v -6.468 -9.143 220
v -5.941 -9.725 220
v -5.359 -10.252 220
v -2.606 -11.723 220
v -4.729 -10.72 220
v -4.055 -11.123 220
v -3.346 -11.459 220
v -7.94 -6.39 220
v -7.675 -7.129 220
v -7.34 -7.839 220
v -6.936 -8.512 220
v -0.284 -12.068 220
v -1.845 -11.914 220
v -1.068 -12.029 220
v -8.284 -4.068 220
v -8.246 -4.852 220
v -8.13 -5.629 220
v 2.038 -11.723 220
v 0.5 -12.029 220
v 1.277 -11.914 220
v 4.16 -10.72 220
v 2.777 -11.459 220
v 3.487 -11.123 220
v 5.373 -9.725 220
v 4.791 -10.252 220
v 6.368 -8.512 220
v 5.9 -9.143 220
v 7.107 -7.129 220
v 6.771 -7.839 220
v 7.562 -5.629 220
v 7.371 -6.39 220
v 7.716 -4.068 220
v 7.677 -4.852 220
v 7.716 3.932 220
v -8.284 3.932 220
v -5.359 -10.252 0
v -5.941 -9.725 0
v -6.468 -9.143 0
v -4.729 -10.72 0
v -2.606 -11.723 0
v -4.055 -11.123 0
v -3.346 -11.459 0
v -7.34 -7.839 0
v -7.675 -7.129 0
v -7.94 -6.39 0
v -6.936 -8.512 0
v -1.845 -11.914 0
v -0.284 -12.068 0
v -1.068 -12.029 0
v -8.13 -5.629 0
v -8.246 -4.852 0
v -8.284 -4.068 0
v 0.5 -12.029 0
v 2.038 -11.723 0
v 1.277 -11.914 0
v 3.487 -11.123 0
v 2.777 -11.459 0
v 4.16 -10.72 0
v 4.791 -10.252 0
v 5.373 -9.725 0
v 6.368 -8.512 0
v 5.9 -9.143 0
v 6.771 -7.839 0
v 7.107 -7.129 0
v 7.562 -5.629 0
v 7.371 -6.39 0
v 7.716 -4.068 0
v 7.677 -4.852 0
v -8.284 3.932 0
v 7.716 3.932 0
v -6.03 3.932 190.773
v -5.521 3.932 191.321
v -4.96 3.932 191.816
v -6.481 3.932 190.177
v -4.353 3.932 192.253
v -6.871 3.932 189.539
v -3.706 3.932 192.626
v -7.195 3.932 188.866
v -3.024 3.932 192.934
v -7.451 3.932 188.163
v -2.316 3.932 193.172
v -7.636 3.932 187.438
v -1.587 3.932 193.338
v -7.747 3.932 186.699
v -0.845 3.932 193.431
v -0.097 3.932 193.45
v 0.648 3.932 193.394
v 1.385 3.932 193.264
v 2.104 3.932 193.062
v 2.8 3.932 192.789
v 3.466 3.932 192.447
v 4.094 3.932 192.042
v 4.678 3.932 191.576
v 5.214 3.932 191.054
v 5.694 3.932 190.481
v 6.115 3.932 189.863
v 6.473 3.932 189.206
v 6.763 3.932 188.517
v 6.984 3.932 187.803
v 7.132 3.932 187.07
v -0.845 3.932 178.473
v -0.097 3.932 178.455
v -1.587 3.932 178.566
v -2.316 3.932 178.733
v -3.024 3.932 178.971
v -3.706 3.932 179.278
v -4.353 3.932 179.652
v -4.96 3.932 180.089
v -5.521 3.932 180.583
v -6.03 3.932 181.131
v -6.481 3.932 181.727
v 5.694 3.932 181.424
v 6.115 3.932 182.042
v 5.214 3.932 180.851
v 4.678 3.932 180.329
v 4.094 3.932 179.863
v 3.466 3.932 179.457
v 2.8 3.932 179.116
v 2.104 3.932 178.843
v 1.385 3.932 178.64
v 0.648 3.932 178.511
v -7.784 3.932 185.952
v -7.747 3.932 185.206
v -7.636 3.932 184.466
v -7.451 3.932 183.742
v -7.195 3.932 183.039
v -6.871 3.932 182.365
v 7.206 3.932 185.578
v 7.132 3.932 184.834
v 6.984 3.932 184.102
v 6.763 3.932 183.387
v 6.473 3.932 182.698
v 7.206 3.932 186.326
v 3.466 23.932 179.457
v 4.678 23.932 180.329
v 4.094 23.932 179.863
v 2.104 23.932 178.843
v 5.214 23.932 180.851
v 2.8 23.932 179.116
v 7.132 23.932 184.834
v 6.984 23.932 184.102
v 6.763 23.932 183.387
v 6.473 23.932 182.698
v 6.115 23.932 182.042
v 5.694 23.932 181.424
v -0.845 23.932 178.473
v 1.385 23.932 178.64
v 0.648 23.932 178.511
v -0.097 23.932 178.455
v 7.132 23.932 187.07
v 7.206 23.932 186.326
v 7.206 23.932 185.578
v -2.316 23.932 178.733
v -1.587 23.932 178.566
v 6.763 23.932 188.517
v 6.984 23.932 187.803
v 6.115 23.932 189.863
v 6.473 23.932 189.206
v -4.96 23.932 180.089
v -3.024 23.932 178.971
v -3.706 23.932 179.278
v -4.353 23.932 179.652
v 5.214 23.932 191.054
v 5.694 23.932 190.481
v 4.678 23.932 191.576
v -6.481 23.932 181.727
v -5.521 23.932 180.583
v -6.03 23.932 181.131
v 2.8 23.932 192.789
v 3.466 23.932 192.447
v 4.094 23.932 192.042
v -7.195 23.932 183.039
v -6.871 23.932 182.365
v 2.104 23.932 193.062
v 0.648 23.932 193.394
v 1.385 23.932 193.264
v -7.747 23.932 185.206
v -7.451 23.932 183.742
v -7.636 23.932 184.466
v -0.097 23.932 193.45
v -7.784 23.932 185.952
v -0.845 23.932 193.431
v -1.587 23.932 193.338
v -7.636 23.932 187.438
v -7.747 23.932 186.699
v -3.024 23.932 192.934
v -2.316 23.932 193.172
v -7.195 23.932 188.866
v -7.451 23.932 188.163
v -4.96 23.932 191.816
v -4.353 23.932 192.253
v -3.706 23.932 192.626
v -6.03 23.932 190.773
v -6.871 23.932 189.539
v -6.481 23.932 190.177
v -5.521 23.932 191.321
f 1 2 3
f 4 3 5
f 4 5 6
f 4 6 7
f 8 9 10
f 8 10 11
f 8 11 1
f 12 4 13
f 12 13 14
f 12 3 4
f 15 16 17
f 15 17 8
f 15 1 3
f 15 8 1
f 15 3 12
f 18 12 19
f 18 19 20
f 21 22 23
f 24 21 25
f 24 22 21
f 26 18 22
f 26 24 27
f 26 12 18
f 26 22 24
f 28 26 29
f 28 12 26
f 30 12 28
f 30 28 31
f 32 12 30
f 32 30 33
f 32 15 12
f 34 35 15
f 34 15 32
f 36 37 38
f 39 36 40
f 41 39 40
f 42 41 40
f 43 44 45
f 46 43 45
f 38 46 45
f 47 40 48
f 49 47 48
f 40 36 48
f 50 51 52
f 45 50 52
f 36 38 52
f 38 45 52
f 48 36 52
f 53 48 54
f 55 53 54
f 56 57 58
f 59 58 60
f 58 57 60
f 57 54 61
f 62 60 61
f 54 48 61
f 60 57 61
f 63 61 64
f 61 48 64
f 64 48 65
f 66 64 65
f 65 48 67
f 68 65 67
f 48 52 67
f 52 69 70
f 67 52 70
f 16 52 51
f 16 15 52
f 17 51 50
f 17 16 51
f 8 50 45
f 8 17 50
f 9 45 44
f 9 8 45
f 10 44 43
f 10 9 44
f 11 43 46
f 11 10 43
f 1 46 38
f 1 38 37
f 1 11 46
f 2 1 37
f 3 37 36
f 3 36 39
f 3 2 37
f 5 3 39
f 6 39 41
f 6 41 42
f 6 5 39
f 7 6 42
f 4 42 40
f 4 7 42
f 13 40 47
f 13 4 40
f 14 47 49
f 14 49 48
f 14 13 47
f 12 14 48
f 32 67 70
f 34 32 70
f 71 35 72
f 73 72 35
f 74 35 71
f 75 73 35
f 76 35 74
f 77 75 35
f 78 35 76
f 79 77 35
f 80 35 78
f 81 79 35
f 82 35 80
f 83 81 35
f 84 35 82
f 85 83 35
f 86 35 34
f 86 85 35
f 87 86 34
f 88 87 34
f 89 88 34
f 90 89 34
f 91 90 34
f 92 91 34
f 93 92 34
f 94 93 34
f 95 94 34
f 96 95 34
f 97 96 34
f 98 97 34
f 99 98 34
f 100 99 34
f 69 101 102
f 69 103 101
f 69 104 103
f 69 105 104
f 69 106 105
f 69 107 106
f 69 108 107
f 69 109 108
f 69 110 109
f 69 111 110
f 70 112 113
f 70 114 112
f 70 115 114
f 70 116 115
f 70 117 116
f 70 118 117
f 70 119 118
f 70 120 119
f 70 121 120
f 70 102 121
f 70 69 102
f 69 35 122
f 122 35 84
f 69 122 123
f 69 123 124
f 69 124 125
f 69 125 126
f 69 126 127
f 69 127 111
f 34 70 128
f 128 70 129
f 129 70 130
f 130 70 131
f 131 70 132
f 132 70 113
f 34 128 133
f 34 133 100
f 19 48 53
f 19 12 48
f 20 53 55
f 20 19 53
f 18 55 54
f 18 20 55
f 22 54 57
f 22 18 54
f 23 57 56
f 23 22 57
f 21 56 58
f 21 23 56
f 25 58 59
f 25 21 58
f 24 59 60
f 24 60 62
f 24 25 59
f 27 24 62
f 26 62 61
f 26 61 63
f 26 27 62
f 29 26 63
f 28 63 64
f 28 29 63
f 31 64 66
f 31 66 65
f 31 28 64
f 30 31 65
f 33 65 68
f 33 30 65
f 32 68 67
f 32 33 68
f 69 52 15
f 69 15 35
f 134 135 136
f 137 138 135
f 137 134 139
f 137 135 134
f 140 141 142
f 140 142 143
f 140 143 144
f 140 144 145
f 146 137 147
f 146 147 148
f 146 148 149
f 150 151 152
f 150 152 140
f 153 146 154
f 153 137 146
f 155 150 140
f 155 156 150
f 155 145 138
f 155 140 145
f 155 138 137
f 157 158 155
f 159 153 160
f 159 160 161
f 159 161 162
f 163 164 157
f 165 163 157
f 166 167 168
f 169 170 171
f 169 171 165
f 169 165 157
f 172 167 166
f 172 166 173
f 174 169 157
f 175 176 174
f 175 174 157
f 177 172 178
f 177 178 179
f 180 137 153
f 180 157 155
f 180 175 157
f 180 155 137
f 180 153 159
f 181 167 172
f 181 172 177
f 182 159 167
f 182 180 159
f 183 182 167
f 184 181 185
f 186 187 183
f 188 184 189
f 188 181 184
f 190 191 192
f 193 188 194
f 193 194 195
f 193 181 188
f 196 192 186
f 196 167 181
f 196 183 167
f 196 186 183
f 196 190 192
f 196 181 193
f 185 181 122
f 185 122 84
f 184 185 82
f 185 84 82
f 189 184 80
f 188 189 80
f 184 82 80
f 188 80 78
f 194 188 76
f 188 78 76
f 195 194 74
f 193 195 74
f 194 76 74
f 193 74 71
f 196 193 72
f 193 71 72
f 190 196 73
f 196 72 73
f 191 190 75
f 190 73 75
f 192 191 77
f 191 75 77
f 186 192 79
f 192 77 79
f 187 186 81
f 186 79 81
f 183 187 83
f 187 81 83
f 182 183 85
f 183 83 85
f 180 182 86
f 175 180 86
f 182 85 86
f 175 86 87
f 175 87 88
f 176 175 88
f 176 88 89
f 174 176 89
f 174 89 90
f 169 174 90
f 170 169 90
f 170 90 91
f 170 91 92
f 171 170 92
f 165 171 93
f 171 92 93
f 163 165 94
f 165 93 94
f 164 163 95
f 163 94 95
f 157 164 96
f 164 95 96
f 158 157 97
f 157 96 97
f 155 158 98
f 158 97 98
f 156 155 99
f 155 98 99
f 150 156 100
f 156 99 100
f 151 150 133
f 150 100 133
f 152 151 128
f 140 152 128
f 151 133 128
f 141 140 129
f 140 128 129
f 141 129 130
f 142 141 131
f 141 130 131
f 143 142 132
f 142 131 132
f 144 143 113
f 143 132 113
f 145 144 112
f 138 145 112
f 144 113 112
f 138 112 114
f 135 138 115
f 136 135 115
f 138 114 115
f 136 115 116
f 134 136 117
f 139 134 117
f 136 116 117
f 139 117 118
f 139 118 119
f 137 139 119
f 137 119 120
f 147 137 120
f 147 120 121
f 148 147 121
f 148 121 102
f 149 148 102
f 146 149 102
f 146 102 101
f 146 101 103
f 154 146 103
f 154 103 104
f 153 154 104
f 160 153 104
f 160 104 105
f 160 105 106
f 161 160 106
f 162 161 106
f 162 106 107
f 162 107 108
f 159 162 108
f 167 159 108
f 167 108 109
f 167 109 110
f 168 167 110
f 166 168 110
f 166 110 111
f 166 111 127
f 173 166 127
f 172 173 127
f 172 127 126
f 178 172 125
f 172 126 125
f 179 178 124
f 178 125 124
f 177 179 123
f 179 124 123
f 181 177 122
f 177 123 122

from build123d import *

# Parameters (mm, degrees)
F0_W     = 16
F0_H     = 16
F1_DEPTH = 220
F2_R     = 7.99999
F3_R     = 7.5
F4_DEPTH = 20


# Not quite as in the source:
# - a fillet or chamfer is up to 0.001 mm smaller than in the source, because OpenCascade refuses the exact size


with BuildPart() as f1:
    # F0 (on Top) → F1 (new body)
    with BuildSketch(Plane.XY):
        with Locations((-0.2842125371, -4.0679279789)):
            Rectangle(F0_W, F0_H)
    extrude(amount=F1_DEPTH)

    # F2 (radius 8 in the source; OpenCascade refuses exactly that, so slightly less here)
    f2_edges = [f1.edges().sort_by_distance(p)[0] for p in [
        (-8.284213, -12.067928, 110),
        (7.715787, -12.067928, 110),
    ]]
    fillet(f2_edges, radius=F2_R)

    # F3 (on face) → F4 (join)
    with BuildSketch(Plane(origin=(0, 3.9320720211, 0), x_dir=(-1, 0, 0), z_dir=(0, 1, 0))):
        with Locations((0.2842125371, 185.9523057938)):
            Circle(F3_R)
    extrude(amount=F4_DEPTH)


solid = f1.part
